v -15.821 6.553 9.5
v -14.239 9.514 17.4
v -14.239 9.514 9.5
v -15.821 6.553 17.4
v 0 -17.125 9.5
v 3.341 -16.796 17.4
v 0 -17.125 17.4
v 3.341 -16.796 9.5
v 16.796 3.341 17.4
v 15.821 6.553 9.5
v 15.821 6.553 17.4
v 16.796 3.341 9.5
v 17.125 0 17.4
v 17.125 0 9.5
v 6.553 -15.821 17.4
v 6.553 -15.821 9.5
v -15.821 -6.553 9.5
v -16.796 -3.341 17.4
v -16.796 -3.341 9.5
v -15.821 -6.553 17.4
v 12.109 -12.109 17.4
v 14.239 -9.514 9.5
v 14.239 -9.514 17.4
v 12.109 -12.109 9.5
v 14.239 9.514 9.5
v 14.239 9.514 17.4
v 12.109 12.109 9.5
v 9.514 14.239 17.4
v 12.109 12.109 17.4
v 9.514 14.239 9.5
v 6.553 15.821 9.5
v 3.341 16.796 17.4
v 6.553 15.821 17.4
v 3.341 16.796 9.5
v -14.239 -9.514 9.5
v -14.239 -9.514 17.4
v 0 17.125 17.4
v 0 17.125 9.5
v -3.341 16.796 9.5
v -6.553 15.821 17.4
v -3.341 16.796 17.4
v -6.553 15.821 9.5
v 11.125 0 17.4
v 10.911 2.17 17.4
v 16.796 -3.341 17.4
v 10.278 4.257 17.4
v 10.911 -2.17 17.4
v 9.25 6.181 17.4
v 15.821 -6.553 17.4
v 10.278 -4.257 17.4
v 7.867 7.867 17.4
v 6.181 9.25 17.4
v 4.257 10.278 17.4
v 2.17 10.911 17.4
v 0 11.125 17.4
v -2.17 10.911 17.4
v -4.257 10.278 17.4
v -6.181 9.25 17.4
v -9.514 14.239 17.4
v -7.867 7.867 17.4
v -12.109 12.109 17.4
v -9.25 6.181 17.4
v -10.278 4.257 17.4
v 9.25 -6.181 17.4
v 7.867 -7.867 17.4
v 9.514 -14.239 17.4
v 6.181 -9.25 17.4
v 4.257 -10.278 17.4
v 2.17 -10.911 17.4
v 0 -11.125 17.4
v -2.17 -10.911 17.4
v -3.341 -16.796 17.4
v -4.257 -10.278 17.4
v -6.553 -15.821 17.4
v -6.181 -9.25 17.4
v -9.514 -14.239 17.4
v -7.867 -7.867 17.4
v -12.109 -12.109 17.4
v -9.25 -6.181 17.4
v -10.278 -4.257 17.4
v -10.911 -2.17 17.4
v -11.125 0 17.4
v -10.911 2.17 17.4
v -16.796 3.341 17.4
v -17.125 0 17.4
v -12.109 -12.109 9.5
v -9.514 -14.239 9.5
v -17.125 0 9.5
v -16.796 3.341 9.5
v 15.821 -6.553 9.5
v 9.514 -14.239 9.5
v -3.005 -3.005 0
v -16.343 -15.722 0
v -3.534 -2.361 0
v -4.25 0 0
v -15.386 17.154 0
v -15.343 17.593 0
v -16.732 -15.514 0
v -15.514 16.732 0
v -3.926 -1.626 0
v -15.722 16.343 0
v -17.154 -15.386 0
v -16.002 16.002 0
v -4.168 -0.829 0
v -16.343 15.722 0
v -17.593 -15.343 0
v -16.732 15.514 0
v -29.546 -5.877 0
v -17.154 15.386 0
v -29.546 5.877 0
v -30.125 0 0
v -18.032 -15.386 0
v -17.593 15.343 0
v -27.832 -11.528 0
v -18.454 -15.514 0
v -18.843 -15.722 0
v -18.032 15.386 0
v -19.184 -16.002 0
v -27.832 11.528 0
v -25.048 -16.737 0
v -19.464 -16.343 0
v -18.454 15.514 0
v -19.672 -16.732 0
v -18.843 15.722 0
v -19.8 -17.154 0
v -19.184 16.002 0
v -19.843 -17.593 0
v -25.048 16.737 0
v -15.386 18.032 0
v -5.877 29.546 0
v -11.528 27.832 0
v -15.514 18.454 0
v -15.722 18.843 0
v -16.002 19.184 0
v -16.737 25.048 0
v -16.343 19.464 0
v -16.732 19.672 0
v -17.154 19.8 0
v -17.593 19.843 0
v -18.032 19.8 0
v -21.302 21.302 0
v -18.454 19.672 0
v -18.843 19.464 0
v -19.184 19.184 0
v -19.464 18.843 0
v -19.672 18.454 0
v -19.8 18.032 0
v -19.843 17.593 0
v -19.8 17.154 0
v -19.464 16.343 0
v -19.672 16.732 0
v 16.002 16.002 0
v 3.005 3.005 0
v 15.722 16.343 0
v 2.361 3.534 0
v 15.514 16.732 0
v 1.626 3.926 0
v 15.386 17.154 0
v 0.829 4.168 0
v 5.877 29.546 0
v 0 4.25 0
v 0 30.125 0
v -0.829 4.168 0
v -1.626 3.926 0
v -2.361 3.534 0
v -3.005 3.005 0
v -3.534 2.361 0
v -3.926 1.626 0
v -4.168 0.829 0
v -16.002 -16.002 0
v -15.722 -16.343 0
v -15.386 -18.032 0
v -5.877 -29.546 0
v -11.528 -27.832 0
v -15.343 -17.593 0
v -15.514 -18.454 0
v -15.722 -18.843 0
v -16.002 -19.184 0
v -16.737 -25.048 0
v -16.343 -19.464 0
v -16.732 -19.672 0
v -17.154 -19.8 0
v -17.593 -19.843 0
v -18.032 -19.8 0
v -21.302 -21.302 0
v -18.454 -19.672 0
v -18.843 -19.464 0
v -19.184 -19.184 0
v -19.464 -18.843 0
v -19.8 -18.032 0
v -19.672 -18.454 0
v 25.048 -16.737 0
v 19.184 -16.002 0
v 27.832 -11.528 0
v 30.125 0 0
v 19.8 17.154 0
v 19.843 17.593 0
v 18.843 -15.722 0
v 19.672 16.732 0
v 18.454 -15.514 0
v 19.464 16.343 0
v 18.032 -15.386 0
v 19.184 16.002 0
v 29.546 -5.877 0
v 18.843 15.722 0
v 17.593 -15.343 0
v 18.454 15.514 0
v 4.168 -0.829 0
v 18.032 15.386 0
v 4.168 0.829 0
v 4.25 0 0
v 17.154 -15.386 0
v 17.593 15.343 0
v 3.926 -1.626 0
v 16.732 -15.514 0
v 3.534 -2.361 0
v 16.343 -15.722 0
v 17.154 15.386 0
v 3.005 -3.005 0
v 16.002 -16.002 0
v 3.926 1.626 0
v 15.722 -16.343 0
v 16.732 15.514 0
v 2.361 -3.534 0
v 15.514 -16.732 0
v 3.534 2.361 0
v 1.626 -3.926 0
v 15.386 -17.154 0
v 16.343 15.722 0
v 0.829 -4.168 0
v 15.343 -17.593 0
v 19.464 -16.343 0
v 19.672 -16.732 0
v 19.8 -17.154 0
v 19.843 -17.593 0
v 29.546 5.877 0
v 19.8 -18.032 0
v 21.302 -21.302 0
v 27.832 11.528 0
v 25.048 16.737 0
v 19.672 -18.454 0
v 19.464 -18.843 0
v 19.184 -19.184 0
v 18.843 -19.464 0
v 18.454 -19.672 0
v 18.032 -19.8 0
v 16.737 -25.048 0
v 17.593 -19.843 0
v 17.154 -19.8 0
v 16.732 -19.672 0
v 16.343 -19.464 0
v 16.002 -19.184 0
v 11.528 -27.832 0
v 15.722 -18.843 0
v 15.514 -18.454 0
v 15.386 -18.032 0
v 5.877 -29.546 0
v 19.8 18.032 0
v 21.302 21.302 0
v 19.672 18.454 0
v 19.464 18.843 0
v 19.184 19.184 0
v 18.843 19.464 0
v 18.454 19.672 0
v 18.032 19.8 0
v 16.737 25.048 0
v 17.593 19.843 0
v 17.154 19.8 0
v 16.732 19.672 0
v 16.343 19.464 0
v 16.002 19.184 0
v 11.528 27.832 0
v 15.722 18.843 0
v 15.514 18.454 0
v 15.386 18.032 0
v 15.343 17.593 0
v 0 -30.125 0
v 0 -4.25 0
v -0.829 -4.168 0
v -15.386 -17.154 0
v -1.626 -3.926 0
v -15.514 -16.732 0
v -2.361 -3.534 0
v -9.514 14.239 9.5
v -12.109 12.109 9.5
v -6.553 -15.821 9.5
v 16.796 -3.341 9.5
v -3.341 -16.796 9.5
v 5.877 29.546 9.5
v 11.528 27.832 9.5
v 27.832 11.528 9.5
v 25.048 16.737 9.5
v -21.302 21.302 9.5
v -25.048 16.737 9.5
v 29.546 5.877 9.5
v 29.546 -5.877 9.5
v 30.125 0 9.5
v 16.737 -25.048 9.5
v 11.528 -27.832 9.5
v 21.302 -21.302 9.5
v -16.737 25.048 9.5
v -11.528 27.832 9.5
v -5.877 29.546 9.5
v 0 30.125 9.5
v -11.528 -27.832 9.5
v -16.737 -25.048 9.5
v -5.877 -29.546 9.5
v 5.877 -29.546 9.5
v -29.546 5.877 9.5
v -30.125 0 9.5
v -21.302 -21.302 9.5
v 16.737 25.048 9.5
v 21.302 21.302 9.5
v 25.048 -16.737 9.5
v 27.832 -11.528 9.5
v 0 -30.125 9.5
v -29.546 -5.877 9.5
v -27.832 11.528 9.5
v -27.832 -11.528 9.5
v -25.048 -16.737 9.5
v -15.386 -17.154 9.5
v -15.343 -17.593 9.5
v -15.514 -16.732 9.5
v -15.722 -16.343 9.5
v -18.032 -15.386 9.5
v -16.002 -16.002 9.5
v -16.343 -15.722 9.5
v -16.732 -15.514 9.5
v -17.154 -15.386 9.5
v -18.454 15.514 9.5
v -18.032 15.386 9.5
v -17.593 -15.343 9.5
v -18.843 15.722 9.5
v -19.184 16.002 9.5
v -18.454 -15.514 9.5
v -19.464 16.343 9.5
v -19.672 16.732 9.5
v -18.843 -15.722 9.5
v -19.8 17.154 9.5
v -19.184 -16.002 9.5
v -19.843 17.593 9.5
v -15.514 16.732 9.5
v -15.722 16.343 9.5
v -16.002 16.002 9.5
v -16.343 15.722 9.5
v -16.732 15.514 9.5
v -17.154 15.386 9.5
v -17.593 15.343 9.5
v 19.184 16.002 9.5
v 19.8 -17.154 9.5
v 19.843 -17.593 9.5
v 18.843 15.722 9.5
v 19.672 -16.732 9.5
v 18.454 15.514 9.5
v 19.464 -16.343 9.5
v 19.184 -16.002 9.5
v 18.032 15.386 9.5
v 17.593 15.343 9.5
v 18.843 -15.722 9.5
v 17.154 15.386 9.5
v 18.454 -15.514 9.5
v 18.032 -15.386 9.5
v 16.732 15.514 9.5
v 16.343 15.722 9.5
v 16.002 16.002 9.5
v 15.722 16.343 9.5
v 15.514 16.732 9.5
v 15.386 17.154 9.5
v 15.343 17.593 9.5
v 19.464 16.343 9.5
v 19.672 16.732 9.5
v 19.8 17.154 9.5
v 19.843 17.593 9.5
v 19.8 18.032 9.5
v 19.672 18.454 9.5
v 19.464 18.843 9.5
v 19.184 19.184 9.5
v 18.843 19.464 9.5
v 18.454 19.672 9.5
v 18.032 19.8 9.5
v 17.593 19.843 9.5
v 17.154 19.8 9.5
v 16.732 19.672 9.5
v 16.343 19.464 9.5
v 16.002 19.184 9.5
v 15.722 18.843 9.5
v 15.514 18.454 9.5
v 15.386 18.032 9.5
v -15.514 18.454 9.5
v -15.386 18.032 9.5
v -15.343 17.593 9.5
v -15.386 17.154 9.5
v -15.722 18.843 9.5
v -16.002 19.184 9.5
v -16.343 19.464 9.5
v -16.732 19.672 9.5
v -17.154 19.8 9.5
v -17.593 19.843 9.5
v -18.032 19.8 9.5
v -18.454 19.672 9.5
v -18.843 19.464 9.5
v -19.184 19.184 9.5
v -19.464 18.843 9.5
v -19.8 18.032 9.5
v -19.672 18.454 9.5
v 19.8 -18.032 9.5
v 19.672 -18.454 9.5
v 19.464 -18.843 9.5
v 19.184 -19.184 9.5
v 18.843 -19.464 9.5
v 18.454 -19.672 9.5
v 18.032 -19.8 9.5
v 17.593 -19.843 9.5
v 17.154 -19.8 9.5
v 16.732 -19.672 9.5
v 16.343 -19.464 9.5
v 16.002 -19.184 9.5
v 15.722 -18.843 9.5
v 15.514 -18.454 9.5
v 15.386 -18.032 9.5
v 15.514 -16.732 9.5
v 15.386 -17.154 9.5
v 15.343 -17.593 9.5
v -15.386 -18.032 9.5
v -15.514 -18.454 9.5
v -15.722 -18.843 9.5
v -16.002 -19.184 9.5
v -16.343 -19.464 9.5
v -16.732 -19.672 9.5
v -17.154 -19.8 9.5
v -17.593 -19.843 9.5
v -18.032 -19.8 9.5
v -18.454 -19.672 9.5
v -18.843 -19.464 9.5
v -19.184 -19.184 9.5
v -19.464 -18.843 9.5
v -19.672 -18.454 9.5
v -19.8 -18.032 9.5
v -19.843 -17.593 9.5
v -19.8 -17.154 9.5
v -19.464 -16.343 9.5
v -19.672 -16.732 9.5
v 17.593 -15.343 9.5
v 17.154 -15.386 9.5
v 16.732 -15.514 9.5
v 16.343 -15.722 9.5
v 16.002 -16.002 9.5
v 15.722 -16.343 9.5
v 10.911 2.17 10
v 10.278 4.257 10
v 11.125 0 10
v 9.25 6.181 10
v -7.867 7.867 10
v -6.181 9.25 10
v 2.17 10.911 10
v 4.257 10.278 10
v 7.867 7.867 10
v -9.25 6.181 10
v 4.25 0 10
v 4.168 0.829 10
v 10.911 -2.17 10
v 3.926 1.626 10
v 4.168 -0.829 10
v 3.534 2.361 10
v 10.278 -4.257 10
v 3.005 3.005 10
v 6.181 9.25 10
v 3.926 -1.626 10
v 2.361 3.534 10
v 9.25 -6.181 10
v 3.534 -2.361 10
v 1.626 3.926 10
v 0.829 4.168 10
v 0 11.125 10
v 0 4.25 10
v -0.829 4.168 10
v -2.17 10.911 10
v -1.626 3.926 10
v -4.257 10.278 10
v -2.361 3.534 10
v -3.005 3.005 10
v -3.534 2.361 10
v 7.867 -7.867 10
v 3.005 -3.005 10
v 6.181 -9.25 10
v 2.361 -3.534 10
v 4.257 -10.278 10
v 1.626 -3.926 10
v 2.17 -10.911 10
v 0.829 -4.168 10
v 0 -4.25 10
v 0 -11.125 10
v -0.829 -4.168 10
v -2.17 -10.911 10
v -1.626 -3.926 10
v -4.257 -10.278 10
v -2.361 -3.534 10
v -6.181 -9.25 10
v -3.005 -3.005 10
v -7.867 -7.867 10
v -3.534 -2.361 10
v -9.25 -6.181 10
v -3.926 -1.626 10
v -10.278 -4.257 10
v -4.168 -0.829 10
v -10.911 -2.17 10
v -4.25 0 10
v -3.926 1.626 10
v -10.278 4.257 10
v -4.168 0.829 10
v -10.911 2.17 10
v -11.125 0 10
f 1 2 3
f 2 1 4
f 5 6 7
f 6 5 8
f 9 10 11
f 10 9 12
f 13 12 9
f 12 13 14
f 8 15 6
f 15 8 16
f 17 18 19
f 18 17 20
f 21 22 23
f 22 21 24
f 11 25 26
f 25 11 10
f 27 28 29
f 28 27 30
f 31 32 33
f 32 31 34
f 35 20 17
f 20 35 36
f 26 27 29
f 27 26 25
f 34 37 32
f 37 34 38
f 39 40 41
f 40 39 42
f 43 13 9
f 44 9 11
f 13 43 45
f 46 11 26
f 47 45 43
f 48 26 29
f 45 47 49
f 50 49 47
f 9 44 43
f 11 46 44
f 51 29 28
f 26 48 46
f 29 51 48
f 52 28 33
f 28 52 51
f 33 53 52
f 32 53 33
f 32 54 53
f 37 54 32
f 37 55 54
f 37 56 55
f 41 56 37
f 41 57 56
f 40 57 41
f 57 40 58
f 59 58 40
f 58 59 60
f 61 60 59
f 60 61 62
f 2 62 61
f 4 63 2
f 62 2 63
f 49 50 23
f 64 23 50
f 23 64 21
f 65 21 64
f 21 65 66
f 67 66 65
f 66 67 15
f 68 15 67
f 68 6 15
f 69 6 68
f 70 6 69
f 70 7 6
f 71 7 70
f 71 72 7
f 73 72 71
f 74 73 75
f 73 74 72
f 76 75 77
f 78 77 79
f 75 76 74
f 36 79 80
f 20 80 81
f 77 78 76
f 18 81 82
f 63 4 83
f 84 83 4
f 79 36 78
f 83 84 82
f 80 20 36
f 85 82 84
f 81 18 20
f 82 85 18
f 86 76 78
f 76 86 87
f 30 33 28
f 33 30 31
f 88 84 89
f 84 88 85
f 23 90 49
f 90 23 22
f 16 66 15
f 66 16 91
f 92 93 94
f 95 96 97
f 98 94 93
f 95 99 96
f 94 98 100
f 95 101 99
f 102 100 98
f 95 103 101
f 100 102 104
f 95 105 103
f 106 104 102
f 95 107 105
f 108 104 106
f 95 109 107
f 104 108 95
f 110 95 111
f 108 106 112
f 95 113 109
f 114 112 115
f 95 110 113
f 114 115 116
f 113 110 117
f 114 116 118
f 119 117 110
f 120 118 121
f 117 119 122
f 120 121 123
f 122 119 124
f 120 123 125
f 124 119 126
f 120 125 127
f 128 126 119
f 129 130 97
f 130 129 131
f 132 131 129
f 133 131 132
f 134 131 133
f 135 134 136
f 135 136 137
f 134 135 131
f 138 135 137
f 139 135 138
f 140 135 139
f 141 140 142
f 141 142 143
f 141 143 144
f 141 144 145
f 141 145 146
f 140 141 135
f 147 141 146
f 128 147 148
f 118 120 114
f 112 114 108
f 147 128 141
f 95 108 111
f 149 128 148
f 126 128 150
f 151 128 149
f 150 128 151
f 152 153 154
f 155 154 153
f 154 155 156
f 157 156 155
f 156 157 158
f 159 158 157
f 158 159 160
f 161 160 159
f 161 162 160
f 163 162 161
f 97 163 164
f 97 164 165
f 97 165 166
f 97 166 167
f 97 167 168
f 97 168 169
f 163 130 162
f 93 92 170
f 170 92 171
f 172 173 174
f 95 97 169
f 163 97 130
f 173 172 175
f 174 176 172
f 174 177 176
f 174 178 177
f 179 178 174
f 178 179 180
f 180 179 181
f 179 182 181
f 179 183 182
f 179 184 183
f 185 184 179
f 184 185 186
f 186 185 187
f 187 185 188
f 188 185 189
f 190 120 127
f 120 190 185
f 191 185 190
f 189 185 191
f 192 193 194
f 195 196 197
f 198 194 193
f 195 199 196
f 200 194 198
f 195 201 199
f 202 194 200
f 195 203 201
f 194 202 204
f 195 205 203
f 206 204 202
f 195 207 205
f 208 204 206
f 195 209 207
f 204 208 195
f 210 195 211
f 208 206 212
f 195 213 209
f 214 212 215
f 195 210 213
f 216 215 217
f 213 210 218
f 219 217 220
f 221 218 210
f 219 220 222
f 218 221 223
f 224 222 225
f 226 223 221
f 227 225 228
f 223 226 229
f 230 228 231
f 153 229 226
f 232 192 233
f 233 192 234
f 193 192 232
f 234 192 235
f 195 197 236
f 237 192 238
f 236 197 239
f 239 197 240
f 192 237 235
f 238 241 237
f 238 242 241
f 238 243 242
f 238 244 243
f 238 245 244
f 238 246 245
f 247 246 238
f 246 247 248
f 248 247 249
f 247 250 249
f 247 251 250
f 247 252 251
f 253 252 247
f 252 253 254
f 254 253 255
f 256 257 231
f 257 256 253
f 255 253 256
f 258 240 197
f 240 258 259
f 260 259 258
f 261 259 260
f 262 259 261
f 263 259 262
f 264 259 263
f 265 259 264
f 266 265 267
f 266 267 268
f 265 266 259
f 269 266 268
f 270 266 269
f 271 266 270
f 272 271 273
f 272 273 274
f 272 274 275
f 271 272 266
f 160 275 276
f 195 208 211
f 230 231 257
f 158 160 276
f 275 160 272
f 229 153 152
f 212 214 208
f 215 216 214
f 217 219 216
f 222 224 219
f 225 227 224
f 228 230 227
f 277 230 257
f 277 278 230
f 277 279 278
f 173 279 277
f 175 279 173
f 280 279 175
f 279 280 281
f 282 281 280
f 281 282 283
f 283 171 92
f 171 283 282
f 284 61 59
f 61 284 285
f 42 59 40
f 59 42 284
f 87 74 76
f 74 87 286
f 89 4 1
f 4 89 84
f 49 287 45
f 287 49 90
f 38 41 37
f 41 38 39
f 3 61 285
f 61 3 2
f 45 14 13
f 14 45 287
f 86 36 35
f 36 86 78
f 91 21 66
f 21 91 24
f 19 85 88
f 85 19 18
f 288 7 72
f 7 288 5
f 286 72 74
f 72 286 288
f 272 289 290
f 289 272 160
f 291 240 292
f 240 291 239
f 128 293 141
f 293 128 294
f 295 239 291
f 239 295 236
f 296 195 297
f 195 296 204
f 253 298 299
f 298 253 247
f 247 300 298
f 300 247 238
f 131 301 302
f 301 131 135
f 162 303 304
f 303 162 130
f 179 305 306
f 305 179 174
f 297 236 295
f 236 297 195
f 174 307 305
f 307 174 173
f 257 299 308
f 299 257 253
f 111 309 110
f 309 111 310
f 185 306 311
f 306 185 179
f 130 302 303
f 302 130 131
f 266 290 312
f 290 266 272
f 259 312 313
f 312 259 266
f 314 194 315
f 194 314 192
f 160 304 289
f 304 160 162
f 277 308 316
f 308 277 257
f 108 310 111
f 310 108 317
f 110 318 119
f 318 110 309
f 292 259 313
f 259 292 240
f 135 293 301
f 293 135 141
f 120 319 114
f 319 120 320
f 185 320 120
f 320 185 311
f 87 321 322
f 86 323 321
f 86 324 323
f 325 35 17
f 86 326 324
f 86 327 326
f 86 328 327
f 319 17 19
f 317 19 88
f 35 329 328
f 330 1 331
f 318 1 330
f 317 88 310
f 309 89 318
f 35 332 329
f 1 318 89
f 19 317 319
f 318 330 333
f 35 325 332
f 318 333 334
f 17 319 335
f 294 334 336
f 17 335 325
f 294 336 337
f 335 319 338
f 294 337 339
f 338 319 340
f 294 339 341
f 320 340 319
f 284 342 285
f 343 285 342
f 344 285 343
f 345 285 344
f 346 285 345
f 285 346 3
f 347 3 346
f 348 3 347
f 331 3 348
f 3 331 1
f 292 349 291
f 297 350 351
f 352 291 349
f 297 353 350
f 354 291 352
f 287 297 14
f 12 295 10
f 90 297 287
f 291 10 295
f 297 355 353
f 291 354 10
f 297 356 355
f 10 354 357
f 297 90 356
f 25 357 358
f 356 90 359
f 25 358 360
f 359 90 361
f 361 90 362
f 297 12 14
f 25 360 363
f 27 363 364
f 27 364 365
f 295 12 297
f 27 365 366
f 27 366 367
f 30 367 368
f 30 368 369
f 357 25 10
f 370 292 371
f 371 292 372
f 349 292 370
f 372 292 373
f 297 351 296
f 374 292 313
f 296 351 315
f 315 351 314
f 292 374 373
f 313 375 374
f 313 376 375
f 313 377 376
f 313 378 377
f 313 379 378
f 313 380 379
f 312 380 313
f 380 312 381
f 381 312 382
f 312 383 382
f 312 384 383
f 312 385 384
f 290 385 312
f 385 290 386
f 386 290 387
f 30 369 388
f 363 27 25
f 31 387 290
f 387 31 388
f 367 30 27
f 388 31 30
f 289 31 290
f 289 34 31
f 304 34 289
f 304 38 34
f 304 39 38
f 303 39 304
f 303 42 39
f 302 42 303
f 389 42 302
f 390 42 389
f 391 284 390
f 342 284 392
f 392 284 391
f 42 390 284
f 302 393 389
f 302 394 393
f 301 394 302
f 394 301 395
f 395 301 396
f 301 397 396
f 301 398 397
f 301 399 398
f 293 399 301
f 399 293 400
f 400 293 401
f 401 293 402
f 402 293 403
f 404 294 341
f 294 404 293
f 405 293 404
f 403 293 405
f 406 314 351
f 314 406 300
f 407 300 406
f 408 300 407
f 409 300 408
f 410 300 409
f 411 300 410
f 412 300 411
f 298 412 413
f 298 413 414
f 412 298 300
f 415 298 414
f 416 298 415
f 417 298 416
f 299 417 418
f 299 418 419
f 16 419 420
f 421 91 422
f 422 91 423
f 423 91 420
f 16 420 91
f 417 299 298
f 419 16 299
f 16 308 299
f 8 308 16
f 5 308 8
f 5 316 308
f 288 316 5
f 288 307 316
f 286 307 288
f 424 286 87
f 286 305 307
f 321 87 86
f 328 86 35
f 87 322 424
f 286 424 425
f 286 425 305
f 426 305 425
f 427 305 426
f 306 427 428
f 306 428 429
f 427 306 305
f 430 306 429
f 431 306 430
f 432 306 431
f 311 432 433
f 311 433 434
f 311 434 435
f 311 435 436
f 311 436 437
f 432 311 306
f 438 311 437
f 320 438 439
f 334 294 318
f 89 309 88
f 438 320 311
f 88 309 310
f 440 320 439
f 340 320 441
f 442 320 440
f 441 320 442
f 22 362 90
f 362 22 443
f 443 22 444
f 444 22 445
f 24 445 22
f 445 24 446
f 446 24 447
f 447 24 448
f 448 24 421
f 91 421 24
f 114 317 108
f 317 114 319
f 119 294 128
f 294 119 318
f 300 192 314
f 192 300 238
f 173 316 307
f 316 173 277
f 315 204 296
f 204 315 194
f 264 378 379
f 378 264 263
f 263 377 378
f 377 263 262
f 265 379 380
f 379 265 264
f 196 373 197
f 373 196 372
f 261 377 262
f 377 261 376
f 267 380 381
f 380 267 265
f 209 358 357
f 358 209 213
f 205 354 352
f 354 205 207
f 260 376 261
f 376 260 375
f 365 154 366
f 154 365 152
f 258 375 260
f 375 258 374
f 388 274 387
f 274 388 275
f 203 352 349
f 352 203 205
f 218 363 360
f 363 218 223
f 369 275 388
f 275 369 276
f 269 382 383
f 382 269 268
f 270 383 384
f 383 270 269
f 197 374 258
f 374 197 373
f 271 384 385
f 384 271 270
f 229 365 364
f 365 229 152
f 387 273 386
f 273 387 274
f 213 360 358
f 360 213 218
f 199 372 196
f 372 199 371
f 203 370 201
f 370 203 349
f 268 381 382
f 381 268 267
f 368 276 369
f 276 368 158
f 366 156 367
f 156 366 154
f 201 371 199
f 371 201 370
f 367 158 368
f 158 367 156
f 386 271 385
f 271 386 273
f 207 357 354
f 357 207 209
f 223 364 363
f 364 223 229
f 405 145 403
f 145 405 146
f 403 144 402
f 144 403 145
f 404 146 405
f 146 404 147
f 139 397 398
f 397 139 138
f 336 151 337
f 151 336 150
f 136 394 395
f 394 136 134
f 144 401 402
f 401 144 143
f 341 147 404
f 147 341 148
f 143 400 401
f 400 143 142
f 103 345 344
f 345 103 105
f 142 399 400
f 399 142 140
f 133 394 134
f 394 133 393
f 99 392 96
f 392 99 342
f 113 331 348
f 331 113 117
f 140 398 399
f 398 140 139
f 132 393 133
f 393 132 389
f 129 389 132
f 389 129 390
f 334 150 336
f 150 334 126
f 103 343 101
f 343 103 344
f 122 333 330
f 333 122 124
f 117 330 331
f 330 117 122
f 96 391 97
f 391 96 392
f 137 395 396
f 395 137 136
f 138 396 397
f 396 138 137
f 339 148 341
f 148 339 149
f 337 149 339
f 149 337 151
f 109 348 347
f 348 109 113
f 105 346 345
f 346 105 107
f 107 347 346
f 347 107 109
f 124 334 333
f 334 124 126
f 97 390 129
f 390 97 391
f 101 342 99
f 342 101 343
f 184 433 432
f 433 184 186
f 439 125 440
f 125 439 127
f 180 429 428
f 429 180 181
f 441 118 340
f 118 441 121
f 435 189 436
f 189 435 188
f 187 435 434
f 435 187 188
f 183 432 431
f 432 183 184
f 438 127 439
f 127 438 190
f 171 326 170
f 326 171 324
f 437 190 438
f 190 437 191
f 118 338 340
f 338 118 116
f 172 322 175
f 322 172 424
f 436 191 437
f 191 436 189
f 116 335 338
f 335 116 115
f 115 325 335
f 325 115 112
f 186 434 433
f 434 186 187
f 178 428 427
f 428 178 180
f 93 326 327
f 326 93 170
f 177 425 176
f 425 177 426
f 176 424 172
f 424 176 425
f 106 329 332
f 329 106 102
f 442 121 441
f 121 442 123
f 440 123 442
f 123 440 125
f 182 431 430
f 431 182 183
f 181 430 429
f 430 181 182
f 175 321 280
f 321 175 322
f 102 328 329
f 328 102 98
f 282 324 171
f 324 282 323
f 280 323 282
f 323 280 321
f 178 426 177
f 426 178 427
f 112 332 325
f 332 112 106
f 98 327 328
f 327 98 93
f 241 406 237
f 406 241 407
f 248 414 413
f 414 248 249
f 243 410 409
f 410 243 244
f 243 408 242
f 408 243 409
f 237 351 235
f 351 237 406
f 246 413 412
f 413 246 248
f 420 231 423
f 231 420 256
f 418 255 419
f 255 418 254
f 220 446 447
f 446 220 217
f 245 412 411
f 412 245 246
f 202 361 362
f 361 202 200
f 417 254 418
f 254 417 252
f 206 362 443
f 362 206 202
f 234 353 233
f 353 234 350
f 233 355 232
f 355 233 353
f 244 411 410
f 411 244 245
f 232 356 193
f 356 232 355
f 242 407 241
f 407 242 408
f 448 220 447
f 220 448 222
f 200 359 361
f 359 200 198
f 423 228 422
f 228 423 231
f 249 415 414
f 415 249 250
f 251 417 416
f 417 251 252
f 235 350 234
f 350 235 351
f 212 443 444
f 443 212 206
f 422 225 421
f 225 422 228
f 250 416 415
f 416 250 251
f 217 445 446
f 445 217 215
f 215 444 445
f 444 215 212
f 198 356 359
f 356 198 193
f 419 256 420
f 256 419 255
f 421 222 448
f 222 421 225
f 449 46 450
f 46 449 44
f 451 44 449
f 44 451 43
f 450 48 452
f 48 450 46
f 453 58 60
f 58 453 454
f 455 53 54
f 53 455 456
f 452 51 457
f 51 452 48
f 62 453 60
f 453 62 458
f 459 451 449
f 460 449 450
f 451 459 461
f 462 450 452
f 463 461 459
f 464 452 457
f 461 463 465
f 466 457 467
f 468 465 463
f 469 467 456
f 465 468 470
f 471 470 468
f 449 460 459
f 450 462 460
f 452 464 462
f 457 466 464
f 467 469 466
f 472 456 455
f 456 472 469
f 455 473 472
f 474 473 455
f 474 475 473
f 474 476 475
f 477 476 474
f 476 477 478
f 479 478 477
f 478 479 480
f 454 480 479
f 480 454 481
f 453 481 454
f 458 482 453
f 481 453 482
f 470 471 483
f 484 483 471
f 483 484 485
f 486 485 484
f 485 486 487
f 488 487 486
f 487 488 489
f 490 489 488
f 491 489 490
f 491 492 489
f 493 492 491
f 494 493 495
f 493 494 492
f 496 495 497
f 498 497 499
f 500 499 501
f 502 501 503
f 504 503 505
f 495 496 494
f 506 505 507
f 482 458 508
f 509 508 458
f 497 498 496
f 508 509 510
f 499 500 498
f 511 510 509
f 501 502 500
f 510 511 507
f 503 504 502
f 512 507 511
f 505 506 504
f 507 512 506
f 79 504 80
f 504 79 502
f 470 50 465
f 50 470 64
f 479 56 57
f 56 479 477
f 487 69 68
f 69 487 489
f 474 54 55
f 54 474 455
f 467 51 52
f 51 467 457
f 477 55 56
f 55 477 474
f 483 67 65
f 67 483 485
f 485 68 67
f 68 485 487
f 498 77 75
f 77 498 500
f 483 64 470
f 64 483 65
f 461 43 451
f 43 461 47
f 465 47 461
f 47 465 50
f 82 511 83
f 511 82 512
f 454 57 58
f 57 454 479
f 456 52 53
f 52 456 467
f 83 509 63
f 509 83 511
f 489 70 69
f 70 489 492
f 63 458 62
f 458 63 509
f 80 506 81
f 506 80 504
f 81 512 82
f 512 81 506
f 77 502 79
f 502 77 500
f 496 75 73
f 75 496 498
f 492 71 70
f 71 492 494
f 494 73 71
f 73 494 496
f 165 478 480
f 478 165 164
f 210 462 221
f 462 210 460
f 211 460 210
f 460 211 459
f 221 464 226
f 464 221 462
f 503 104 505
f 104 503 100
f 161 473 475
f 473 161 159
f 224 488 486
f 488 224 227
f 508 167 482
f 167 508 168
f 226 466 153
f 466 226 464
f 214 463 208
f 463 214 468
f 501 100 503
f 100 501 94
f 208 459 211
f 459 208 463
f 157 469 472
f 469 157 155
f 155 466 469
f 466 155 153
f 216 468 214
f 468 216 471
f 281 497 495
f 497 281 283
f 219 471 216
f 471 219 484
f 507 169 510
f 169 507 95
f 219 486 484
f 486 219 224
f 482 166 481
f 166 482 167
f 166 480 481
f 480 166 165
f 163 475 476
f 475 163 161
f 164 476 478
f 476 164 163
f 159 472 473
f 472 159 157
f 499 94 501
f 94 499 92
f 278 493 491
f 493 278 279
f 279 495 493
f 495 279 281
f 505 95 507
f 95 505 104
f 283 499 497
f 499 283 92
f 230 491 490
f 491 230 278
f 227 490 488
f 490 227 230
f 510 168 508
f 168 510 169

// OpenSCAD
$fn = 32;

// ----------------------------------------------------------------------
// Bearing housing: seat for 608 (22 x 7 mm), 34.25 mm body
// ----------------------------------------------------------------------

// --- parameters (mm) ---
body_od = 34.25;          // housing outside diameter
body_h = 17.4;            // overall housing height
wall = 6;                 // wall thickness
pocket_d = 22.25;         // 608 seat, 0.25 mm clearance
seat_h = 7.4;             // pocket depth
shoulder = 2;             // shoulder under the bearing
pass_d = 8.5;             // shaft passage
flange_dia = 60.25;       // mounting flange diameter
flange_t = 8;             // flange thickness
bolt_d = 4.5;             // flange bolt clearance
bolt_r = 24.88;           // flange bolt circle radius

module body() {
  cylinder(h = body_h, d = body_od);
}

module flange() {
  /* flange sunk 1.5 mm into the body */
  cylinder(h = flange_t + 1.5, d = flange_dia);
}

difference() {
  union() {
    body();
    flange();
  }
  translate([0, 0, body_h - seat_h]) cylinder(h = seat_h + 1, d = pocket_d);
  translate([0, 0, -1]) cylinder(h = body_h - seat_h + 1, d = pass_d);
  for (i = [0 : 3]) rotate([0, 0, 45 + i * 90]) translate([bolt_r, 0, -1])
    cylinder(h = flange_t + 3, d = bolt_d);
}
